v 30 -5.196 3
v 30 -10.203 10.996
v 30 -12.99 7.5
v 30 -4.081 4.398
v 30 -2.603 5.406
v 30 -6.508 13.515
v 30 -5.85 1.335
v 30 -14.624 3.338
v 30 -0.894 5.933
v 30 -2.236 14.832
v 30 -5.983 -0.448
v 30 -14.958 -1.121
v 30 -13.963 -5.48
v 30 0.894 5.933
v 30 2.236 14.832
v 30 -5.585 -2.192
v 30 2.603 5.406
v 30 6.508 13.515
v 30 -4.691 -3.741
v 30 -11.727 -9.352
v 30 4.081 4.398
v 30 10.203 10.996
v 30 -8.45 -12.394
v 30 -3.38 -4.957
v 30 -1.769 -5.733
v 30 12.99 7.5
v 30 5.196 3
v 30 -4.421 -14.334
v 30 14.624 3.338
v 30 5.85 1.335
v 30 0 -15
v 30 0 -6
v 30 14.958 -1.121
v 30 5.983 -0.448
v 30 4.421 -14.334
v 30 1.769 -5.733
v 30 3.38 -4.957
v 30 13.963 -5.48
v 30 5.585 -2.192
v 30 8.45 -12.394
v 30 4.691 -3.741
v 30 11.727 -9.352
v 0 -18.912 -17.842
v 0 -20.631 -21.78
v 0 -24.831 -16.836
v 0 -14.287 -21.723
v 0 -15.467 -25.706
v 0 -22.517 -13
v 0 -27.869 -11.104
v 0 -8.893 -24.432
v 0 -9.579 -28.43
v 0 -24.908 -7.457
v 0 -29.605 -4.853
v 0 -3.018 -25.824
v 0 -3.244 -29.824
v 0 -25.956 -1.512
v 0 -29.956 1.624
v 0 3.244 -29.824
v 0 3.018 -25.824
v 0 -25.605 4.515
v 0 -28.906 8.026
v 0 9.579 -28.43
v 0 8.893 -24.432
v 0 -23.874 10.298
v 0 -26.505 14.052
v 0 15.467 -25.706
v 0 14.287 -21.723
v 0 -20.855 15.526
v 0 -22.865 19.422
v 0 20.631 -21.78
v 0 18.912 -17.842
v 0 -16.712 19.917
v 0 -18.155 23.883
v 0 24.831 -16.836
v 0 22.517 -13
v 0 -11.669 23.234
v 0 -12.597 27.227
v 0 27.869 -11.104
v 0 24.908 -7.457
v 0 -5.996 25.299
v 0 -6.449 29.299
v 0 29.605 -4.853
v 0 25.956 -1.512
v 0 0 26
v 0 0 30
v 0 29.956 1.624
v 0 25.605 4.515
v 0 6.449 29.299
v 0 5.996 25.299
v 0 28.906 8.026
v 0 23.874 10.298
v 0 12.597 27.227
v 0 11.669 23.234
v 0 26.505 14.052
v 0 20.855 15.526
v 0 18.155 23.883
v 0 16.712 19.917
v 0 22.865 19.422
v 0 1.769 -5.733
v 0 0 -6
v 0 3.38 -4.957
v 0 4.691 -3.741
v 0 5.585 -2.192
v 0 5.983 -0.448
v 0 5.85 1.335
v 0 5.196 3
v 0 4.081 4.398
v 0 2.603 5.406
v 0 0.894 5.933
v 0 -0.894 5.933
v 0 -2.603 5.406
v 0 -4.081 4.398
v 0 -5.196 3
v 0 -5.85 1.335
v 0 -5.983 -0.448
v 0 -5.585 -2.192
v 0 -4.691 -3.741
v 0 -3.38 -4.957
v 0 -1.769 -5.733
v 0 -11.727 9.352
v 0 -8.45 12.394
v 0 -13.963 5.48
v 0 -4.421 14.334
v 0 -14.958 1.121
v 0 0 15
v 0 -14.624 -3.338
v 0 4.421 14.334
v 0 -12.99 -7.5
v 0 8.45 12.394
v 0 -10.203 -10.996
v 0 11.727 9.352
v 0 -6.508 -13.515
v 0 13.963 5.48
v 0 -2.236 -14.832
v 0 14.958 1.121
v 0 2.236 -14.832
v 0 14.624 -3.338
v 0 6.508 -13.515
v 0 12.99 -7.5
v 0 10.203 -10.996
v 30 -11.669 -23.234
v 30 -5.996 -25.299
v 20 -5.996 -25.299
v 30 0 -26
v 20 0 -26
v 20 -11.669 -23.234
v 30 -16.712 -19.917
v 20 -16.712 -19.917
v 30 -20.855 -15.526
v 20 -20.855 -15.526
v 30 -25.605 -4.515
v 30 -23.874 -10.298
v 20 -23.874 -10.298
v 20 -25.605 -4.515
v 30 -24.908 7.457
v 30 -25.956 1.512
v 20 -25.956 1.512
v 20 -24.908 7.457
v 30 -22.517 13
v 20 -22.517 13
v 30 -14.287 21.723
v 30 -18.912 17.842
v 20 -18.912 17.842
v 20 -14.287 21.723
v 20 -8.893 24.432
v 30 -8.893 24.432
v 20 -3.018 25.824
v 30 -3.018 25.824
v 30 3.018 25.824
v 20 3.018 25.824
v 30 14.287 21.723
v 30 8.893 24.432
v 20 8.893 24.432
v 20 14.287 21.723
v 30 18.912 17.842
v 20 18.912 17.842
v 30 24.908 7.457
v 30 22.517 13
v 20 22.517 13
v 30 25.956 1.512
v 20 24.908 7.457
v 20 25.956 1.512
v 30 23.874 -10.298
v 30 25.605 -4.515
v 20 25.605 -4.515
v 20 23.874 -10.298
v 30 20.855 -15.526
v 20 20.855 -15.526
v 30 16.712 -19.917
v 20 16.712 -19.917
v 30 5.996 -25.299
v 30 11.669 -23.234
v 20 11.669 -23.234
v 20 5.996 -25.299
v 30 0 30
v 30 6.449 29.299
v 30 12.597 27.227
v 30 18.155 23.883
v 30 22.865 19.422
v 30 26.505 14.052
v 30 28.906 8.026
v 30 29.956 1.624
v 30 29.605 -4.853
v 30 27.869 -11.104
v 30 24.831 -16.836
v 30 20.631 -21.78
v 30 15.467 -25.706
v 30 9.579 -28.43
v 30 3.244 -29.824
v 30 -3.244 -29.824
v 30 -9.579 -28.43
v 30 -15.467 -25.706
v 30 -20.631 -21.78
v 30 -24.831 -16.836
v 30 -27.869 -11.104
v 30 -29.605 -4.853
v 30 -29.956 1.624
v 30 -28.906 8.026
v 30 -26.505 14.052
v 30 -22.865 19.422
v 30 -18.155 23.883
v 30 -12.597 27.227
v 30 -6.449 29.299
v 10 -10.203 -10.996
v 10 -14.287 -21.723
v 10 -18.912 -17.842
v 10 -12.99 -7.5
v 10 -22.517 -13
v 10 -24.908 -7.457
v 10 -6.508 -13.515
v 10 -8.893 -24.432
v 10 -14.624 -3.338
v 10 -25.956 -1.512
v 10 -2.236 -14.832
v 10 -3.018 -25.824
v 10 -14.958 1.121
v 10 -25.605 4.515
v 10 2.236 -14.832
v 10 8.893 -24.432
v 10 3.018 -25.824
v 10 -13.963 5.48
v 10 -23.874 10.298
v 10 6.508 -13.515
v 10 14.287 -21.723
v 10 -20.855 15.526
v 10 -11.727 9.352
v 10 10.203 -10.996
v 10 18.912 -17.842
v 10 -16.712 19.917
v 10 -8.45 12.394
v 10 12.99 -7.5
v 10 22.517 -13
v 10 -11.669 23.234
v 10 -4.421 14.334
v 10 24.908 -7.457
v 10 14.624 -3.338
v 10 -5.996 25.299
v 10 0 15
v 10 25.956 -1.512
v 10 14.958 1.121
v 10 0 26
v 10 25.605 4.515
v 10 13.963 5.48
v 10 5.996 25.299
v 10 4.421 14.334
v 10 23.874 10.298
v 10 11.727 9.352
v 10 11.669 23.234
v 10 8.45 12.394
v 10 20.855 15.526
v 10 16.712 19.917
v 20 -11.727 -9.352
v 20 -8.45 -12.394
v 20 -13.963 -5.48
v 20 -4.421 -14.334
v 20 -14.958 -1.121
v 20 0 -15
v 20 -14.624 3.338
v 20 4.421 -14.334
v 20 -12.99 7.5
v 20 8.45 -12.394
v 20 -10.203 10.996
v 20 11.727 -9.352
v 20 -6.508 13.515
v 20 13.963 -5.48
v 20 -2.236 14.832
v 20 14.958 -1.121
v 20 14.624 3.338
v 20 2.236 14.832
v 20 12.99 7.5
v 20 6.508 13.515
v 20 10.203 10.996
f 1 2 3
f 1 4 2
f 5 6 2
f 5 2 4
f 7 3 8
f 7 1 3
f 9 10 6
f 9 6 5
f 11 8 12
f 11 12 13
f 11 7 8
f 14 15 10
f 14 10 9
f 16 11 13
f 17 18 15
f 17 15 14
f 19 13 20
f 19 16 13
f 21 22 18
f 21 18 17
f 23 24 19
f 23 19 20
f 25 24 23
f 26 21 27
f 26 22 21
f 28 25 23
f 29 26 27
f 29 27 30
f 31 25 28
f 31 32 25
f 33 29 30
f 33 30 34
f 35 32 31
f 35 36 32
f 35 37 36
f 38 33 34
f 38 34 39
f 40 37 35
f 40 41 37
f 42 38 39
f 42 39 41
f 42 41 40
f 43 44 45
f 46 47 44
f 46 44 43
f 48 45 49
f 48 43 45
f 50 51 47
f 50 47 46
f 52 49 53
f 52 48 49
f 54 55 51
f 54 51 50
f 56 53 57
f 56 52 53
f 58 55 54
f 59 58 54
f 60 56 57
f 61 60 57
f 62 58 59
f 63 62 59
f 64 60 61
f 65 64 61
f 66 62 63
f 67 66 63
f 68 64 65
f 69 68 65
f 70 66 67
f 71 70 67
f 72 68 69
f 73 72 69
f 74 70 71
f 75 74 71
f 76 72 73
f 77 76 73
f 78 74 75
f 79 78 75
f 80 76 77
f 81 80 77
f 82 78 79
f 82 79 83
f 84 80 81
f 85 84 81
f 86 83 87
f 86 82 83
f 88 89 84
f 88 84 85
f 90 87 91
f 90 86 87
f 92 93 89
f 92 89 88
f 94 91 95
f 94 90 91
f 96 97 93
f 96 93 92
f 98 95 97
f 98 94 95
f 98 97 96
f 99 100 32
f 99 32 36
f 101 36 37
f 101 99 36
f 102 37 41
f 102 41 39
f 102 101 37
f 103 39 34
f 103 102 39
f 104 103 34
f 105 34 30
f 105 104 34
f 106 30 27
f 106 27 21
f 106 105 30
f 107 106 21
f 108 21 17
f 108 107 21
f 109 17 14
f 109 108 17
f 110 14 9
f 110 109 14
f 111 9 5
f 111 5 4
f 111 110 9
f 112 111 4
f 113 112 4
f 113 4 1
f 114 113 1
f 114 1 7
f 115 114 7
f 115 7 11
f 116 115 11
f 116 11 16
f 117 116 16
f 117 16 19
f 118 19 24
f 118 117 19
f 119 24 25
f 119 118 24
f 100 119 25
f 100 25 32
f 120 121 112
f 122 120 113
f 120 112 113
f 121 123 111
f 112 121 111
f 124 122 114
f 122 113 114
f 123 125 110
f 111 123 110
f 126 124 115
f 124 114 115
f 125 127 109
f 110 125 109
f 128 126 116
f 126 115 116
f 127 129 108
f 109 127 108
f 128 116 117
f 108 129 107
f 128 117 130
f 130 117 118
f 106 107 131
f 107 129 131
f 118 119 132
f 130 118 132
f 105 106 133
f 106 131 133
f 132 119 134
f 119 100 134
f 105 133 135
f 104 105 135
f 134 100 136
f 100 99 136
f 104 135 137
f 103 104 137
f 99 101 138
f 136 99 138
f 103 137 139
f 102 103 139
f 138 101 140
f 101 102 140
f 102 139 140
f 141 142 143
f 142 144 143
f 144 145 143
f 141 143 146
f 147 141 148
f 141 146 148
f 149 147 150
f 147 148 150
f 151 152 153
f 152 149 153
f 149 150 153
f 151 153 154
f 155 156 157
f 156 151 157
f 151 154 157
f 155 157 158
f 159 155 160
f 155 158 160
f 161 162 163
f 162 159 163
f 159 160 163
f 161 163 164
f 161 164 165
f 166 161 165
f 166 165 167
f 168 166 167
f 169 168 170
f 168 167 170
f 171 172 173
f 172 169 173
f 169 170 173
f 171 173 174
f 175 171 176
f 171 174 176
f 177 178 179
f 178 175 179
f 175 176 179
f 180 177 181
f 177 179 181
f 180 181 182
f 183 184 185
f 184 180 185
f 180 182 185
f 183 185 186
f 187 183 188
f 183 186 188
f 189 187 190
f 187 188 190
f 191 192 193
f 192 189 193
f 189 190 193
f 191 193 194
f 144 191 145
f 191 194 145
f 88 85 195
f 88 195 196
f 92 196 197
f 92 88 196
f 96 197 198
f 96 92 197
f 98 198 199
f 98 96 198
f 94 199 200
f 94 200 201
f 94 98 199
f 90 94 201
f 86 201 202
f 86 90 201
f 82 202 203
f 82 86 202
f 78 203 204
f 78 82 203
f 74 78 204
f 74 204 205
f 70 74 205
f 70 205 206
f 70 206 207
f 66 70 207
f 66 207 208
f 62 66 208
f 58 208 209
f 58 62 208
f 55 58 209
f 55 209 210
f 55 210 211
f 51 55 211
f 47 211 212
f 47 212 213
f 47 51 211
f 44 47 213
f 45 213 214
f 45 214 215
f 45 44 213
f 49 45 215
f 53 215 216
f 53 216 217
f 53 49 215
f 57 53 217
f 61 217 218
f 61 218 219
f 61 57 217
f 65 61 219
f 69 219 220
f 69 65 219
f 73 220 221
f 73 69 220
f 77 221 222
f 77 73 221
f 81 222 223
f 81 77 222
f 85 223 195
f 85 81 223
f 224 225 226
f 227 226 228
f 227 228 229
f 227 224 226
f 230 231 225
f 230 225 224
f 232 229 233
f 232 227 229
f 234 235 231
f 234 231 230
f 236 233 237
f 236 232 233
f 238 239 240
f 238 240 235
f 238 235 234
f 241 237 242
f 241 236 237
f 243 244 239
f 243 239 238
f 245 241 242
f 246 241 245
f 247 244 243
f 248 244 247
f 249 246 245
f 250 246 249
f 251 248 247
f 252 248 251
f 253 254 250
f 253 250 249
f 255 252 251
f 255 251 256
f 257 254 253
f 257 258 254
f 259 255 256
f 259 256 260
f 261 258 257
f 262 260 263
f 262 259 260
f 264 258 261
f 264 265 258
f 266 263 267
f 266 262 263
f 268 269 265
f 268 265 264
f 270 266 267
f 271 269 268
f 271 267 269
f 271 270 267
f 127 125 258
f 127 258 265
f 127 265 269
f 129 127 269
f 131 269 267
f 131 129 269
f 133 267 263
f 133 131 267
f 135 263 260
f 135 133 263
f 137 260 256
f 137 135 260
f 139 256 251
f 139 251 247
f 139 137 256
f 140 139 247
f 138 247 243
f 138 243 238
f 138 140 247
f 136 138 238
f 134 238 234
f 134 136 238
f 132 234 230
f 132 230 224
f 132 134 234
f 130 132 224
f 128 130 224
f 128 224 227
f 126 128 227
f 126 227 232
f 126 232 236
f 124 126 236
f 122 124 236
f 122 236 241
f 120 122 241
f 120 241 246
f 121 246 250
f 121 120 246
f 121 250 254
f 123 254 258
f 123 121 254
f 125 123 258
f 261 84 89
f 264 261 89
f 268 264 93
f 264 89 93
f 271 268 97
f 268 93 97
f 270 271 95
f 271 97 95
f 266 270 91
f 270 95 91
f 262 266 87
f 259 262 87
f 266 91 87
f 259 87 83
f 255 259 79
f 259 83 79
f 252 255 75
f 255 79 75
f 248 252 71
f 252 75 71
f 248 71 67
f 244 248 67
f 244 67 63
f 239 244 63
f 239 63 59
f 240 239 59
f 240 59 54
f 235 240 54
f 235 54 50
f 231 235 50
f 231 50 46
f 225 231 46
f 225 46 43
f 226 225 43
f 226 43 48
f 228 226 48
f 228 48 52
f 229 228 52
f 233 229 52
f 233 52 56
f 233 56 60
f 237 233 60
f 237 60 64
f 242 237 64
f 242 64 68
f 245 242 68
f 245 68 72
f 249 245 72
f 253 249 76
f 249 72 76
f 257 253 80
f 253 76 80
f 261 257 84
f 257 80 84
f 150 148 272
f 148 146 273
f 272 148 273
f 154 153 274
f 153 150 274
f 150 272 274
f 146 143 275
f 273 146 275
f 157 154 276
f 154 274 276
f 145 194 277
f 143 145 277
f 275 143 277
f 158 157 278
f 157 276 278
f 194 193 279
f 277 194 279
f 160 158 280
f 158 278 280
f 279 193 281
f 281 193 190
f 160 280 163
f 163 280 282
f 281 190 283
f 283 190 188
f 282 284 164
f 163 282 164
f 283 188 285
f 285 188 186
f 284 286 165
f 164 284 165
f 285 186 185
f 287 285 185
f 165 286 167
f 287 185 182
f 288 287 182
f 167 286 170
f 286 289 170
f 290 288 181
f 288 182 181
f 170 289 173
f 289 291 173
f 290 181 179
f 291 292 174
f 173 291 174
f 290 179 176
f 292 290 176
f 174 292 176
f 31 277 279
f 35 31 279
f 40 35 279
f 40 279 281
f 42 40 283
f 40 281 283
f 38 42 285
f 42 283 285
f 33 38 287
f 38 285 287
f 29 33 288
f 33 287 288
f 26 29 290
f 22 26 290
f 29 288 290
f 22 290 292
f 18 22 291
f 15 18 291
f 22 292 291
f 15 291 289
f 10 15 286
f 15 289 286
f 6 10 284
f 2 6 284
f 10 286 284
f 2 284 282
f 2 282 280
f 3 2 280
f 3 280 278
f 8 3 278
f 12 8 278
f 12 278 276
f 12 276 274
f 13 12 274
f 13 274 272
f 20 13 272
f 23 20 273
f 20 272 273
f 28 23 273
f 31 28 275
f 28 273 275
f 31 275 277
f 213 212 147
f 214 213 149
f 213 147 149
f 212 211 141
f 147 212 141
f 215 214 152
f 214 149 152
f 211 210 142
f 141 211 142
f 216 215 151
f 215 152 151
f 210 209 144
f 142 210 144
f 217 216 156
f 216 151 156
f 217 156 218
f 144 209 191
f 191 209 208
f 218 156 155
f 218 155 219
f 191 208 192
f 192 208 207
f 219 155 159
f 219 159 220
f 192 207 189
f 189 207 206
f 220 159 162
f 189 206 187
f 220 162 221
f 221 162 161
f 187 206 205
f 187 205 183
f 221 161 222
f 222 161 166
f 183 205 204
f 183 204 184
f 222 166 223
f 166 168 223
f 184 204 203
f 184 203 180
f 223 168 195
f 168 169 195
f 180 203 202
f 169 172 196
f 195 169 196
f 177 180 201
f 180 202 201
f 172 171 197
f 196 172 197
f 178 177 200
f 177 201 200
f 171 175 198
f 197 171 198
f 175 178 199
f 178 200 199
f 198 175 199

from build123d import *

# Parameters (mm, degrees)
IZIM1_R                          = 15
Y_KSEKLIK_EKSTR_ZYON1_DEPTH      = 30
IZIM2_R                          = 10
KES_EKSTR_ZYON2_DEPTH            = 30
IZIM13_R                         = 30
Y_KSEKLIK_EKSTR_ZYON3_DEPTH      = 30
IZIM14_R                         = 26
KES_EKSTR_ZYON3_DEPTH            = 15
IZIM15_R                         = 15
Y_KSEKLIK_EKSTR_ZYON4_DEPTH      = 15
Y_KSEKLIK_EKSTR_ZYON4_DEPTH_BACK = 15
IZIM16_R                         = 10
KES_EKSTR_ZYON5_DEPTH            = 45
IZIM17_R                         = 26
KES_EKSTR_ZYON8_DEPTH            = 1
KES_EKSTR_ZYON8_DEPTH_BACK       = 15
IZIM19_R                         = 26
Y_KSEKLIK_EKSTR_ZYON5_DEPTH      = 5
Y_KSEKLIK_EKSTR_ZYON5_DEPTH_BACK = 5
IZIM20_R                         = 15
Y_KSEKLIK_EKSTR_ZYON6_DEPTH      = 10
IZIM21_R                         = 10
KES_EKSTR_ZYON9_DEPTH            = 55
IZIM24_R                         = 15
KES_EKSTR_ZYON10_DEPTH           = 15
IZIM26_R                         = 10
IZIM26_R_2                       = 6
Y_KSEKLIK_EKSTR_ZYON7_DEPTH      = 30


with BuildPart() as part:
    # Çizim1 → Yükseklik-Ekstrüzyon1 (new body)
    with BuildSketch(Plane(origin=(0, 0, 0), x_dir=(0, 0, -1), z_dir=(1, 0, 0))):
        Circle(IZIM1_R)
    extrude(amount=Y_KSEKLIK_EKSTR_ZYON1_DEPTH)

    # Çizim2 → Kes-Ekstrüzyon2 (cut)
    with BuildSketch(Plane.ZY):
        Circle(IZIM2_R)
    extrude(amount=-KES_EKSTR_ZYON2_DEPTH, mode=Mode.SUBTRACT)

    # Çizim13 → Yükseklik-Ekstrüzyon3 (add)
    with BuildSketch(Plane.ZY):
        Circle(IZIM13_R)
    extrude(amount=-Y_KSEKLIK_EKSTR_ZYON3_DEPTH)

    # Çizim14 → Kes-Ekstrüzyon3 (cut)
    with BuildSketch(Plane.ZY):
        Circle(IZIM14_R)
    extrude(amount=-KES_EKSTR_ZYON3_DEPTH, mode=Mode.SUBTRACT)

    # Çizim15 → Yükseklik-Ekstrüzyon4 (add, two sides)
    with BuildSketch(Plane.ZY) as y_kseklik_ekstr_zyon4_sk:
        Circle(IZIM15_R)
    extrude(amount=Y_KSEKLIK_EKSTR_ZYON4_DEPTH)
    extrude(y_kseklik_ekstr_zyon4_sk.sketch, amount=-Y_KSEKLIK_EKSTR_ZYON4_DEPTH_BACK)

    # Çizim16 → Kes-Ekstrüzyon5 (cut)
    with BuildSketch(Plane.ZY.offset(15)):
        Circle(IZIM16_R)
    extrude(amount=-KES_EKSTR_ZYON5_DEPTH, mode=Mode.SUBTRACT)

    # Çizim17 → Kes-Ekstrüzyon8 (cut, two sides)
    with BuildSketch(Plane(origin=(30, 0, 0), x_dir=(0, 0, -1), z_dir=(1, 0, 0))) as kes_ekstr_zyon8_sk:
        Circle(IZIM17_R)
    extrude(amount=KES_EKSTR_ZYON8_DEPTH, mode=Mode.SUBTRACT)
    extrude(kes_ekstr_zyon8_sk.sketch, amount=-KES_EKSTR_ZYON8_DEPTH_BACK, mode=Mode.SUBTRACT)

    # Çizim19 → Yükseklik-Ekstrüzyon5 (add, two sides)
    with BuildSketch(Plane.ZY.offset(-15)) as y_kseklik_ekstr_zyon5_sk:
        Circle(IZIM19_R)
    extrude(amount=Y_KSEKLIK_EKSTR_ZYON5_DEPTH)
    extrude(y_kseklik_ekstr_zyon5_sk.sketch, amount=-Y_KSEKLIK_EKSTR_ZYON5_DEPTH_BACK)

    # Çizim20 → Yükseklik-Ekstrüzyon6 (add)
    with BuildSketch(Plane(origin=(20, 0, 0), x_dir=(0, 0, -1), z_dir=(1, 0, 0))):
        Circle(IZIM20_R)
    extrude(amount=Y_KSEKLIK_EKSTR_ZYON6_DEPTH)

    # Çizim21 → Kes-Ekstrüzyon9 (cut)
    with BuildSketch(Plane.ZY.offset(15)):
        Circle(IZIM21_R)
    extrude(amount=-KES_EKSTR_ZYON9_DEPTH, mode=Mode.SUBTRACT)

    # Çizim24 → Kes-Ekstrüzyon10 (cut)
    with BuildSketch(Plane.ZY.offset(15)):
        Circle(IZIM24_R)
    extrude(amount=-KES_EKSTR_ZYON10_DEPTH, mode=Mode.SUBTRACT)

    # Çizim26 → Yükseklik-Ekstrüzyon7 (add)
    with BuildSketch(Plane(origin=(0, 0, 0), x_dir=(0, 0, -1), z_dir=(1, 0, 0))):
        Circle(IZIM26_R)
        Circle(IZIM26_R_2, mode=Mode.SUBTRACT)
    extrude(amount=Y_KSEKLIK_EKSTR_ZYON7_DEPTH)


solid = part.part
